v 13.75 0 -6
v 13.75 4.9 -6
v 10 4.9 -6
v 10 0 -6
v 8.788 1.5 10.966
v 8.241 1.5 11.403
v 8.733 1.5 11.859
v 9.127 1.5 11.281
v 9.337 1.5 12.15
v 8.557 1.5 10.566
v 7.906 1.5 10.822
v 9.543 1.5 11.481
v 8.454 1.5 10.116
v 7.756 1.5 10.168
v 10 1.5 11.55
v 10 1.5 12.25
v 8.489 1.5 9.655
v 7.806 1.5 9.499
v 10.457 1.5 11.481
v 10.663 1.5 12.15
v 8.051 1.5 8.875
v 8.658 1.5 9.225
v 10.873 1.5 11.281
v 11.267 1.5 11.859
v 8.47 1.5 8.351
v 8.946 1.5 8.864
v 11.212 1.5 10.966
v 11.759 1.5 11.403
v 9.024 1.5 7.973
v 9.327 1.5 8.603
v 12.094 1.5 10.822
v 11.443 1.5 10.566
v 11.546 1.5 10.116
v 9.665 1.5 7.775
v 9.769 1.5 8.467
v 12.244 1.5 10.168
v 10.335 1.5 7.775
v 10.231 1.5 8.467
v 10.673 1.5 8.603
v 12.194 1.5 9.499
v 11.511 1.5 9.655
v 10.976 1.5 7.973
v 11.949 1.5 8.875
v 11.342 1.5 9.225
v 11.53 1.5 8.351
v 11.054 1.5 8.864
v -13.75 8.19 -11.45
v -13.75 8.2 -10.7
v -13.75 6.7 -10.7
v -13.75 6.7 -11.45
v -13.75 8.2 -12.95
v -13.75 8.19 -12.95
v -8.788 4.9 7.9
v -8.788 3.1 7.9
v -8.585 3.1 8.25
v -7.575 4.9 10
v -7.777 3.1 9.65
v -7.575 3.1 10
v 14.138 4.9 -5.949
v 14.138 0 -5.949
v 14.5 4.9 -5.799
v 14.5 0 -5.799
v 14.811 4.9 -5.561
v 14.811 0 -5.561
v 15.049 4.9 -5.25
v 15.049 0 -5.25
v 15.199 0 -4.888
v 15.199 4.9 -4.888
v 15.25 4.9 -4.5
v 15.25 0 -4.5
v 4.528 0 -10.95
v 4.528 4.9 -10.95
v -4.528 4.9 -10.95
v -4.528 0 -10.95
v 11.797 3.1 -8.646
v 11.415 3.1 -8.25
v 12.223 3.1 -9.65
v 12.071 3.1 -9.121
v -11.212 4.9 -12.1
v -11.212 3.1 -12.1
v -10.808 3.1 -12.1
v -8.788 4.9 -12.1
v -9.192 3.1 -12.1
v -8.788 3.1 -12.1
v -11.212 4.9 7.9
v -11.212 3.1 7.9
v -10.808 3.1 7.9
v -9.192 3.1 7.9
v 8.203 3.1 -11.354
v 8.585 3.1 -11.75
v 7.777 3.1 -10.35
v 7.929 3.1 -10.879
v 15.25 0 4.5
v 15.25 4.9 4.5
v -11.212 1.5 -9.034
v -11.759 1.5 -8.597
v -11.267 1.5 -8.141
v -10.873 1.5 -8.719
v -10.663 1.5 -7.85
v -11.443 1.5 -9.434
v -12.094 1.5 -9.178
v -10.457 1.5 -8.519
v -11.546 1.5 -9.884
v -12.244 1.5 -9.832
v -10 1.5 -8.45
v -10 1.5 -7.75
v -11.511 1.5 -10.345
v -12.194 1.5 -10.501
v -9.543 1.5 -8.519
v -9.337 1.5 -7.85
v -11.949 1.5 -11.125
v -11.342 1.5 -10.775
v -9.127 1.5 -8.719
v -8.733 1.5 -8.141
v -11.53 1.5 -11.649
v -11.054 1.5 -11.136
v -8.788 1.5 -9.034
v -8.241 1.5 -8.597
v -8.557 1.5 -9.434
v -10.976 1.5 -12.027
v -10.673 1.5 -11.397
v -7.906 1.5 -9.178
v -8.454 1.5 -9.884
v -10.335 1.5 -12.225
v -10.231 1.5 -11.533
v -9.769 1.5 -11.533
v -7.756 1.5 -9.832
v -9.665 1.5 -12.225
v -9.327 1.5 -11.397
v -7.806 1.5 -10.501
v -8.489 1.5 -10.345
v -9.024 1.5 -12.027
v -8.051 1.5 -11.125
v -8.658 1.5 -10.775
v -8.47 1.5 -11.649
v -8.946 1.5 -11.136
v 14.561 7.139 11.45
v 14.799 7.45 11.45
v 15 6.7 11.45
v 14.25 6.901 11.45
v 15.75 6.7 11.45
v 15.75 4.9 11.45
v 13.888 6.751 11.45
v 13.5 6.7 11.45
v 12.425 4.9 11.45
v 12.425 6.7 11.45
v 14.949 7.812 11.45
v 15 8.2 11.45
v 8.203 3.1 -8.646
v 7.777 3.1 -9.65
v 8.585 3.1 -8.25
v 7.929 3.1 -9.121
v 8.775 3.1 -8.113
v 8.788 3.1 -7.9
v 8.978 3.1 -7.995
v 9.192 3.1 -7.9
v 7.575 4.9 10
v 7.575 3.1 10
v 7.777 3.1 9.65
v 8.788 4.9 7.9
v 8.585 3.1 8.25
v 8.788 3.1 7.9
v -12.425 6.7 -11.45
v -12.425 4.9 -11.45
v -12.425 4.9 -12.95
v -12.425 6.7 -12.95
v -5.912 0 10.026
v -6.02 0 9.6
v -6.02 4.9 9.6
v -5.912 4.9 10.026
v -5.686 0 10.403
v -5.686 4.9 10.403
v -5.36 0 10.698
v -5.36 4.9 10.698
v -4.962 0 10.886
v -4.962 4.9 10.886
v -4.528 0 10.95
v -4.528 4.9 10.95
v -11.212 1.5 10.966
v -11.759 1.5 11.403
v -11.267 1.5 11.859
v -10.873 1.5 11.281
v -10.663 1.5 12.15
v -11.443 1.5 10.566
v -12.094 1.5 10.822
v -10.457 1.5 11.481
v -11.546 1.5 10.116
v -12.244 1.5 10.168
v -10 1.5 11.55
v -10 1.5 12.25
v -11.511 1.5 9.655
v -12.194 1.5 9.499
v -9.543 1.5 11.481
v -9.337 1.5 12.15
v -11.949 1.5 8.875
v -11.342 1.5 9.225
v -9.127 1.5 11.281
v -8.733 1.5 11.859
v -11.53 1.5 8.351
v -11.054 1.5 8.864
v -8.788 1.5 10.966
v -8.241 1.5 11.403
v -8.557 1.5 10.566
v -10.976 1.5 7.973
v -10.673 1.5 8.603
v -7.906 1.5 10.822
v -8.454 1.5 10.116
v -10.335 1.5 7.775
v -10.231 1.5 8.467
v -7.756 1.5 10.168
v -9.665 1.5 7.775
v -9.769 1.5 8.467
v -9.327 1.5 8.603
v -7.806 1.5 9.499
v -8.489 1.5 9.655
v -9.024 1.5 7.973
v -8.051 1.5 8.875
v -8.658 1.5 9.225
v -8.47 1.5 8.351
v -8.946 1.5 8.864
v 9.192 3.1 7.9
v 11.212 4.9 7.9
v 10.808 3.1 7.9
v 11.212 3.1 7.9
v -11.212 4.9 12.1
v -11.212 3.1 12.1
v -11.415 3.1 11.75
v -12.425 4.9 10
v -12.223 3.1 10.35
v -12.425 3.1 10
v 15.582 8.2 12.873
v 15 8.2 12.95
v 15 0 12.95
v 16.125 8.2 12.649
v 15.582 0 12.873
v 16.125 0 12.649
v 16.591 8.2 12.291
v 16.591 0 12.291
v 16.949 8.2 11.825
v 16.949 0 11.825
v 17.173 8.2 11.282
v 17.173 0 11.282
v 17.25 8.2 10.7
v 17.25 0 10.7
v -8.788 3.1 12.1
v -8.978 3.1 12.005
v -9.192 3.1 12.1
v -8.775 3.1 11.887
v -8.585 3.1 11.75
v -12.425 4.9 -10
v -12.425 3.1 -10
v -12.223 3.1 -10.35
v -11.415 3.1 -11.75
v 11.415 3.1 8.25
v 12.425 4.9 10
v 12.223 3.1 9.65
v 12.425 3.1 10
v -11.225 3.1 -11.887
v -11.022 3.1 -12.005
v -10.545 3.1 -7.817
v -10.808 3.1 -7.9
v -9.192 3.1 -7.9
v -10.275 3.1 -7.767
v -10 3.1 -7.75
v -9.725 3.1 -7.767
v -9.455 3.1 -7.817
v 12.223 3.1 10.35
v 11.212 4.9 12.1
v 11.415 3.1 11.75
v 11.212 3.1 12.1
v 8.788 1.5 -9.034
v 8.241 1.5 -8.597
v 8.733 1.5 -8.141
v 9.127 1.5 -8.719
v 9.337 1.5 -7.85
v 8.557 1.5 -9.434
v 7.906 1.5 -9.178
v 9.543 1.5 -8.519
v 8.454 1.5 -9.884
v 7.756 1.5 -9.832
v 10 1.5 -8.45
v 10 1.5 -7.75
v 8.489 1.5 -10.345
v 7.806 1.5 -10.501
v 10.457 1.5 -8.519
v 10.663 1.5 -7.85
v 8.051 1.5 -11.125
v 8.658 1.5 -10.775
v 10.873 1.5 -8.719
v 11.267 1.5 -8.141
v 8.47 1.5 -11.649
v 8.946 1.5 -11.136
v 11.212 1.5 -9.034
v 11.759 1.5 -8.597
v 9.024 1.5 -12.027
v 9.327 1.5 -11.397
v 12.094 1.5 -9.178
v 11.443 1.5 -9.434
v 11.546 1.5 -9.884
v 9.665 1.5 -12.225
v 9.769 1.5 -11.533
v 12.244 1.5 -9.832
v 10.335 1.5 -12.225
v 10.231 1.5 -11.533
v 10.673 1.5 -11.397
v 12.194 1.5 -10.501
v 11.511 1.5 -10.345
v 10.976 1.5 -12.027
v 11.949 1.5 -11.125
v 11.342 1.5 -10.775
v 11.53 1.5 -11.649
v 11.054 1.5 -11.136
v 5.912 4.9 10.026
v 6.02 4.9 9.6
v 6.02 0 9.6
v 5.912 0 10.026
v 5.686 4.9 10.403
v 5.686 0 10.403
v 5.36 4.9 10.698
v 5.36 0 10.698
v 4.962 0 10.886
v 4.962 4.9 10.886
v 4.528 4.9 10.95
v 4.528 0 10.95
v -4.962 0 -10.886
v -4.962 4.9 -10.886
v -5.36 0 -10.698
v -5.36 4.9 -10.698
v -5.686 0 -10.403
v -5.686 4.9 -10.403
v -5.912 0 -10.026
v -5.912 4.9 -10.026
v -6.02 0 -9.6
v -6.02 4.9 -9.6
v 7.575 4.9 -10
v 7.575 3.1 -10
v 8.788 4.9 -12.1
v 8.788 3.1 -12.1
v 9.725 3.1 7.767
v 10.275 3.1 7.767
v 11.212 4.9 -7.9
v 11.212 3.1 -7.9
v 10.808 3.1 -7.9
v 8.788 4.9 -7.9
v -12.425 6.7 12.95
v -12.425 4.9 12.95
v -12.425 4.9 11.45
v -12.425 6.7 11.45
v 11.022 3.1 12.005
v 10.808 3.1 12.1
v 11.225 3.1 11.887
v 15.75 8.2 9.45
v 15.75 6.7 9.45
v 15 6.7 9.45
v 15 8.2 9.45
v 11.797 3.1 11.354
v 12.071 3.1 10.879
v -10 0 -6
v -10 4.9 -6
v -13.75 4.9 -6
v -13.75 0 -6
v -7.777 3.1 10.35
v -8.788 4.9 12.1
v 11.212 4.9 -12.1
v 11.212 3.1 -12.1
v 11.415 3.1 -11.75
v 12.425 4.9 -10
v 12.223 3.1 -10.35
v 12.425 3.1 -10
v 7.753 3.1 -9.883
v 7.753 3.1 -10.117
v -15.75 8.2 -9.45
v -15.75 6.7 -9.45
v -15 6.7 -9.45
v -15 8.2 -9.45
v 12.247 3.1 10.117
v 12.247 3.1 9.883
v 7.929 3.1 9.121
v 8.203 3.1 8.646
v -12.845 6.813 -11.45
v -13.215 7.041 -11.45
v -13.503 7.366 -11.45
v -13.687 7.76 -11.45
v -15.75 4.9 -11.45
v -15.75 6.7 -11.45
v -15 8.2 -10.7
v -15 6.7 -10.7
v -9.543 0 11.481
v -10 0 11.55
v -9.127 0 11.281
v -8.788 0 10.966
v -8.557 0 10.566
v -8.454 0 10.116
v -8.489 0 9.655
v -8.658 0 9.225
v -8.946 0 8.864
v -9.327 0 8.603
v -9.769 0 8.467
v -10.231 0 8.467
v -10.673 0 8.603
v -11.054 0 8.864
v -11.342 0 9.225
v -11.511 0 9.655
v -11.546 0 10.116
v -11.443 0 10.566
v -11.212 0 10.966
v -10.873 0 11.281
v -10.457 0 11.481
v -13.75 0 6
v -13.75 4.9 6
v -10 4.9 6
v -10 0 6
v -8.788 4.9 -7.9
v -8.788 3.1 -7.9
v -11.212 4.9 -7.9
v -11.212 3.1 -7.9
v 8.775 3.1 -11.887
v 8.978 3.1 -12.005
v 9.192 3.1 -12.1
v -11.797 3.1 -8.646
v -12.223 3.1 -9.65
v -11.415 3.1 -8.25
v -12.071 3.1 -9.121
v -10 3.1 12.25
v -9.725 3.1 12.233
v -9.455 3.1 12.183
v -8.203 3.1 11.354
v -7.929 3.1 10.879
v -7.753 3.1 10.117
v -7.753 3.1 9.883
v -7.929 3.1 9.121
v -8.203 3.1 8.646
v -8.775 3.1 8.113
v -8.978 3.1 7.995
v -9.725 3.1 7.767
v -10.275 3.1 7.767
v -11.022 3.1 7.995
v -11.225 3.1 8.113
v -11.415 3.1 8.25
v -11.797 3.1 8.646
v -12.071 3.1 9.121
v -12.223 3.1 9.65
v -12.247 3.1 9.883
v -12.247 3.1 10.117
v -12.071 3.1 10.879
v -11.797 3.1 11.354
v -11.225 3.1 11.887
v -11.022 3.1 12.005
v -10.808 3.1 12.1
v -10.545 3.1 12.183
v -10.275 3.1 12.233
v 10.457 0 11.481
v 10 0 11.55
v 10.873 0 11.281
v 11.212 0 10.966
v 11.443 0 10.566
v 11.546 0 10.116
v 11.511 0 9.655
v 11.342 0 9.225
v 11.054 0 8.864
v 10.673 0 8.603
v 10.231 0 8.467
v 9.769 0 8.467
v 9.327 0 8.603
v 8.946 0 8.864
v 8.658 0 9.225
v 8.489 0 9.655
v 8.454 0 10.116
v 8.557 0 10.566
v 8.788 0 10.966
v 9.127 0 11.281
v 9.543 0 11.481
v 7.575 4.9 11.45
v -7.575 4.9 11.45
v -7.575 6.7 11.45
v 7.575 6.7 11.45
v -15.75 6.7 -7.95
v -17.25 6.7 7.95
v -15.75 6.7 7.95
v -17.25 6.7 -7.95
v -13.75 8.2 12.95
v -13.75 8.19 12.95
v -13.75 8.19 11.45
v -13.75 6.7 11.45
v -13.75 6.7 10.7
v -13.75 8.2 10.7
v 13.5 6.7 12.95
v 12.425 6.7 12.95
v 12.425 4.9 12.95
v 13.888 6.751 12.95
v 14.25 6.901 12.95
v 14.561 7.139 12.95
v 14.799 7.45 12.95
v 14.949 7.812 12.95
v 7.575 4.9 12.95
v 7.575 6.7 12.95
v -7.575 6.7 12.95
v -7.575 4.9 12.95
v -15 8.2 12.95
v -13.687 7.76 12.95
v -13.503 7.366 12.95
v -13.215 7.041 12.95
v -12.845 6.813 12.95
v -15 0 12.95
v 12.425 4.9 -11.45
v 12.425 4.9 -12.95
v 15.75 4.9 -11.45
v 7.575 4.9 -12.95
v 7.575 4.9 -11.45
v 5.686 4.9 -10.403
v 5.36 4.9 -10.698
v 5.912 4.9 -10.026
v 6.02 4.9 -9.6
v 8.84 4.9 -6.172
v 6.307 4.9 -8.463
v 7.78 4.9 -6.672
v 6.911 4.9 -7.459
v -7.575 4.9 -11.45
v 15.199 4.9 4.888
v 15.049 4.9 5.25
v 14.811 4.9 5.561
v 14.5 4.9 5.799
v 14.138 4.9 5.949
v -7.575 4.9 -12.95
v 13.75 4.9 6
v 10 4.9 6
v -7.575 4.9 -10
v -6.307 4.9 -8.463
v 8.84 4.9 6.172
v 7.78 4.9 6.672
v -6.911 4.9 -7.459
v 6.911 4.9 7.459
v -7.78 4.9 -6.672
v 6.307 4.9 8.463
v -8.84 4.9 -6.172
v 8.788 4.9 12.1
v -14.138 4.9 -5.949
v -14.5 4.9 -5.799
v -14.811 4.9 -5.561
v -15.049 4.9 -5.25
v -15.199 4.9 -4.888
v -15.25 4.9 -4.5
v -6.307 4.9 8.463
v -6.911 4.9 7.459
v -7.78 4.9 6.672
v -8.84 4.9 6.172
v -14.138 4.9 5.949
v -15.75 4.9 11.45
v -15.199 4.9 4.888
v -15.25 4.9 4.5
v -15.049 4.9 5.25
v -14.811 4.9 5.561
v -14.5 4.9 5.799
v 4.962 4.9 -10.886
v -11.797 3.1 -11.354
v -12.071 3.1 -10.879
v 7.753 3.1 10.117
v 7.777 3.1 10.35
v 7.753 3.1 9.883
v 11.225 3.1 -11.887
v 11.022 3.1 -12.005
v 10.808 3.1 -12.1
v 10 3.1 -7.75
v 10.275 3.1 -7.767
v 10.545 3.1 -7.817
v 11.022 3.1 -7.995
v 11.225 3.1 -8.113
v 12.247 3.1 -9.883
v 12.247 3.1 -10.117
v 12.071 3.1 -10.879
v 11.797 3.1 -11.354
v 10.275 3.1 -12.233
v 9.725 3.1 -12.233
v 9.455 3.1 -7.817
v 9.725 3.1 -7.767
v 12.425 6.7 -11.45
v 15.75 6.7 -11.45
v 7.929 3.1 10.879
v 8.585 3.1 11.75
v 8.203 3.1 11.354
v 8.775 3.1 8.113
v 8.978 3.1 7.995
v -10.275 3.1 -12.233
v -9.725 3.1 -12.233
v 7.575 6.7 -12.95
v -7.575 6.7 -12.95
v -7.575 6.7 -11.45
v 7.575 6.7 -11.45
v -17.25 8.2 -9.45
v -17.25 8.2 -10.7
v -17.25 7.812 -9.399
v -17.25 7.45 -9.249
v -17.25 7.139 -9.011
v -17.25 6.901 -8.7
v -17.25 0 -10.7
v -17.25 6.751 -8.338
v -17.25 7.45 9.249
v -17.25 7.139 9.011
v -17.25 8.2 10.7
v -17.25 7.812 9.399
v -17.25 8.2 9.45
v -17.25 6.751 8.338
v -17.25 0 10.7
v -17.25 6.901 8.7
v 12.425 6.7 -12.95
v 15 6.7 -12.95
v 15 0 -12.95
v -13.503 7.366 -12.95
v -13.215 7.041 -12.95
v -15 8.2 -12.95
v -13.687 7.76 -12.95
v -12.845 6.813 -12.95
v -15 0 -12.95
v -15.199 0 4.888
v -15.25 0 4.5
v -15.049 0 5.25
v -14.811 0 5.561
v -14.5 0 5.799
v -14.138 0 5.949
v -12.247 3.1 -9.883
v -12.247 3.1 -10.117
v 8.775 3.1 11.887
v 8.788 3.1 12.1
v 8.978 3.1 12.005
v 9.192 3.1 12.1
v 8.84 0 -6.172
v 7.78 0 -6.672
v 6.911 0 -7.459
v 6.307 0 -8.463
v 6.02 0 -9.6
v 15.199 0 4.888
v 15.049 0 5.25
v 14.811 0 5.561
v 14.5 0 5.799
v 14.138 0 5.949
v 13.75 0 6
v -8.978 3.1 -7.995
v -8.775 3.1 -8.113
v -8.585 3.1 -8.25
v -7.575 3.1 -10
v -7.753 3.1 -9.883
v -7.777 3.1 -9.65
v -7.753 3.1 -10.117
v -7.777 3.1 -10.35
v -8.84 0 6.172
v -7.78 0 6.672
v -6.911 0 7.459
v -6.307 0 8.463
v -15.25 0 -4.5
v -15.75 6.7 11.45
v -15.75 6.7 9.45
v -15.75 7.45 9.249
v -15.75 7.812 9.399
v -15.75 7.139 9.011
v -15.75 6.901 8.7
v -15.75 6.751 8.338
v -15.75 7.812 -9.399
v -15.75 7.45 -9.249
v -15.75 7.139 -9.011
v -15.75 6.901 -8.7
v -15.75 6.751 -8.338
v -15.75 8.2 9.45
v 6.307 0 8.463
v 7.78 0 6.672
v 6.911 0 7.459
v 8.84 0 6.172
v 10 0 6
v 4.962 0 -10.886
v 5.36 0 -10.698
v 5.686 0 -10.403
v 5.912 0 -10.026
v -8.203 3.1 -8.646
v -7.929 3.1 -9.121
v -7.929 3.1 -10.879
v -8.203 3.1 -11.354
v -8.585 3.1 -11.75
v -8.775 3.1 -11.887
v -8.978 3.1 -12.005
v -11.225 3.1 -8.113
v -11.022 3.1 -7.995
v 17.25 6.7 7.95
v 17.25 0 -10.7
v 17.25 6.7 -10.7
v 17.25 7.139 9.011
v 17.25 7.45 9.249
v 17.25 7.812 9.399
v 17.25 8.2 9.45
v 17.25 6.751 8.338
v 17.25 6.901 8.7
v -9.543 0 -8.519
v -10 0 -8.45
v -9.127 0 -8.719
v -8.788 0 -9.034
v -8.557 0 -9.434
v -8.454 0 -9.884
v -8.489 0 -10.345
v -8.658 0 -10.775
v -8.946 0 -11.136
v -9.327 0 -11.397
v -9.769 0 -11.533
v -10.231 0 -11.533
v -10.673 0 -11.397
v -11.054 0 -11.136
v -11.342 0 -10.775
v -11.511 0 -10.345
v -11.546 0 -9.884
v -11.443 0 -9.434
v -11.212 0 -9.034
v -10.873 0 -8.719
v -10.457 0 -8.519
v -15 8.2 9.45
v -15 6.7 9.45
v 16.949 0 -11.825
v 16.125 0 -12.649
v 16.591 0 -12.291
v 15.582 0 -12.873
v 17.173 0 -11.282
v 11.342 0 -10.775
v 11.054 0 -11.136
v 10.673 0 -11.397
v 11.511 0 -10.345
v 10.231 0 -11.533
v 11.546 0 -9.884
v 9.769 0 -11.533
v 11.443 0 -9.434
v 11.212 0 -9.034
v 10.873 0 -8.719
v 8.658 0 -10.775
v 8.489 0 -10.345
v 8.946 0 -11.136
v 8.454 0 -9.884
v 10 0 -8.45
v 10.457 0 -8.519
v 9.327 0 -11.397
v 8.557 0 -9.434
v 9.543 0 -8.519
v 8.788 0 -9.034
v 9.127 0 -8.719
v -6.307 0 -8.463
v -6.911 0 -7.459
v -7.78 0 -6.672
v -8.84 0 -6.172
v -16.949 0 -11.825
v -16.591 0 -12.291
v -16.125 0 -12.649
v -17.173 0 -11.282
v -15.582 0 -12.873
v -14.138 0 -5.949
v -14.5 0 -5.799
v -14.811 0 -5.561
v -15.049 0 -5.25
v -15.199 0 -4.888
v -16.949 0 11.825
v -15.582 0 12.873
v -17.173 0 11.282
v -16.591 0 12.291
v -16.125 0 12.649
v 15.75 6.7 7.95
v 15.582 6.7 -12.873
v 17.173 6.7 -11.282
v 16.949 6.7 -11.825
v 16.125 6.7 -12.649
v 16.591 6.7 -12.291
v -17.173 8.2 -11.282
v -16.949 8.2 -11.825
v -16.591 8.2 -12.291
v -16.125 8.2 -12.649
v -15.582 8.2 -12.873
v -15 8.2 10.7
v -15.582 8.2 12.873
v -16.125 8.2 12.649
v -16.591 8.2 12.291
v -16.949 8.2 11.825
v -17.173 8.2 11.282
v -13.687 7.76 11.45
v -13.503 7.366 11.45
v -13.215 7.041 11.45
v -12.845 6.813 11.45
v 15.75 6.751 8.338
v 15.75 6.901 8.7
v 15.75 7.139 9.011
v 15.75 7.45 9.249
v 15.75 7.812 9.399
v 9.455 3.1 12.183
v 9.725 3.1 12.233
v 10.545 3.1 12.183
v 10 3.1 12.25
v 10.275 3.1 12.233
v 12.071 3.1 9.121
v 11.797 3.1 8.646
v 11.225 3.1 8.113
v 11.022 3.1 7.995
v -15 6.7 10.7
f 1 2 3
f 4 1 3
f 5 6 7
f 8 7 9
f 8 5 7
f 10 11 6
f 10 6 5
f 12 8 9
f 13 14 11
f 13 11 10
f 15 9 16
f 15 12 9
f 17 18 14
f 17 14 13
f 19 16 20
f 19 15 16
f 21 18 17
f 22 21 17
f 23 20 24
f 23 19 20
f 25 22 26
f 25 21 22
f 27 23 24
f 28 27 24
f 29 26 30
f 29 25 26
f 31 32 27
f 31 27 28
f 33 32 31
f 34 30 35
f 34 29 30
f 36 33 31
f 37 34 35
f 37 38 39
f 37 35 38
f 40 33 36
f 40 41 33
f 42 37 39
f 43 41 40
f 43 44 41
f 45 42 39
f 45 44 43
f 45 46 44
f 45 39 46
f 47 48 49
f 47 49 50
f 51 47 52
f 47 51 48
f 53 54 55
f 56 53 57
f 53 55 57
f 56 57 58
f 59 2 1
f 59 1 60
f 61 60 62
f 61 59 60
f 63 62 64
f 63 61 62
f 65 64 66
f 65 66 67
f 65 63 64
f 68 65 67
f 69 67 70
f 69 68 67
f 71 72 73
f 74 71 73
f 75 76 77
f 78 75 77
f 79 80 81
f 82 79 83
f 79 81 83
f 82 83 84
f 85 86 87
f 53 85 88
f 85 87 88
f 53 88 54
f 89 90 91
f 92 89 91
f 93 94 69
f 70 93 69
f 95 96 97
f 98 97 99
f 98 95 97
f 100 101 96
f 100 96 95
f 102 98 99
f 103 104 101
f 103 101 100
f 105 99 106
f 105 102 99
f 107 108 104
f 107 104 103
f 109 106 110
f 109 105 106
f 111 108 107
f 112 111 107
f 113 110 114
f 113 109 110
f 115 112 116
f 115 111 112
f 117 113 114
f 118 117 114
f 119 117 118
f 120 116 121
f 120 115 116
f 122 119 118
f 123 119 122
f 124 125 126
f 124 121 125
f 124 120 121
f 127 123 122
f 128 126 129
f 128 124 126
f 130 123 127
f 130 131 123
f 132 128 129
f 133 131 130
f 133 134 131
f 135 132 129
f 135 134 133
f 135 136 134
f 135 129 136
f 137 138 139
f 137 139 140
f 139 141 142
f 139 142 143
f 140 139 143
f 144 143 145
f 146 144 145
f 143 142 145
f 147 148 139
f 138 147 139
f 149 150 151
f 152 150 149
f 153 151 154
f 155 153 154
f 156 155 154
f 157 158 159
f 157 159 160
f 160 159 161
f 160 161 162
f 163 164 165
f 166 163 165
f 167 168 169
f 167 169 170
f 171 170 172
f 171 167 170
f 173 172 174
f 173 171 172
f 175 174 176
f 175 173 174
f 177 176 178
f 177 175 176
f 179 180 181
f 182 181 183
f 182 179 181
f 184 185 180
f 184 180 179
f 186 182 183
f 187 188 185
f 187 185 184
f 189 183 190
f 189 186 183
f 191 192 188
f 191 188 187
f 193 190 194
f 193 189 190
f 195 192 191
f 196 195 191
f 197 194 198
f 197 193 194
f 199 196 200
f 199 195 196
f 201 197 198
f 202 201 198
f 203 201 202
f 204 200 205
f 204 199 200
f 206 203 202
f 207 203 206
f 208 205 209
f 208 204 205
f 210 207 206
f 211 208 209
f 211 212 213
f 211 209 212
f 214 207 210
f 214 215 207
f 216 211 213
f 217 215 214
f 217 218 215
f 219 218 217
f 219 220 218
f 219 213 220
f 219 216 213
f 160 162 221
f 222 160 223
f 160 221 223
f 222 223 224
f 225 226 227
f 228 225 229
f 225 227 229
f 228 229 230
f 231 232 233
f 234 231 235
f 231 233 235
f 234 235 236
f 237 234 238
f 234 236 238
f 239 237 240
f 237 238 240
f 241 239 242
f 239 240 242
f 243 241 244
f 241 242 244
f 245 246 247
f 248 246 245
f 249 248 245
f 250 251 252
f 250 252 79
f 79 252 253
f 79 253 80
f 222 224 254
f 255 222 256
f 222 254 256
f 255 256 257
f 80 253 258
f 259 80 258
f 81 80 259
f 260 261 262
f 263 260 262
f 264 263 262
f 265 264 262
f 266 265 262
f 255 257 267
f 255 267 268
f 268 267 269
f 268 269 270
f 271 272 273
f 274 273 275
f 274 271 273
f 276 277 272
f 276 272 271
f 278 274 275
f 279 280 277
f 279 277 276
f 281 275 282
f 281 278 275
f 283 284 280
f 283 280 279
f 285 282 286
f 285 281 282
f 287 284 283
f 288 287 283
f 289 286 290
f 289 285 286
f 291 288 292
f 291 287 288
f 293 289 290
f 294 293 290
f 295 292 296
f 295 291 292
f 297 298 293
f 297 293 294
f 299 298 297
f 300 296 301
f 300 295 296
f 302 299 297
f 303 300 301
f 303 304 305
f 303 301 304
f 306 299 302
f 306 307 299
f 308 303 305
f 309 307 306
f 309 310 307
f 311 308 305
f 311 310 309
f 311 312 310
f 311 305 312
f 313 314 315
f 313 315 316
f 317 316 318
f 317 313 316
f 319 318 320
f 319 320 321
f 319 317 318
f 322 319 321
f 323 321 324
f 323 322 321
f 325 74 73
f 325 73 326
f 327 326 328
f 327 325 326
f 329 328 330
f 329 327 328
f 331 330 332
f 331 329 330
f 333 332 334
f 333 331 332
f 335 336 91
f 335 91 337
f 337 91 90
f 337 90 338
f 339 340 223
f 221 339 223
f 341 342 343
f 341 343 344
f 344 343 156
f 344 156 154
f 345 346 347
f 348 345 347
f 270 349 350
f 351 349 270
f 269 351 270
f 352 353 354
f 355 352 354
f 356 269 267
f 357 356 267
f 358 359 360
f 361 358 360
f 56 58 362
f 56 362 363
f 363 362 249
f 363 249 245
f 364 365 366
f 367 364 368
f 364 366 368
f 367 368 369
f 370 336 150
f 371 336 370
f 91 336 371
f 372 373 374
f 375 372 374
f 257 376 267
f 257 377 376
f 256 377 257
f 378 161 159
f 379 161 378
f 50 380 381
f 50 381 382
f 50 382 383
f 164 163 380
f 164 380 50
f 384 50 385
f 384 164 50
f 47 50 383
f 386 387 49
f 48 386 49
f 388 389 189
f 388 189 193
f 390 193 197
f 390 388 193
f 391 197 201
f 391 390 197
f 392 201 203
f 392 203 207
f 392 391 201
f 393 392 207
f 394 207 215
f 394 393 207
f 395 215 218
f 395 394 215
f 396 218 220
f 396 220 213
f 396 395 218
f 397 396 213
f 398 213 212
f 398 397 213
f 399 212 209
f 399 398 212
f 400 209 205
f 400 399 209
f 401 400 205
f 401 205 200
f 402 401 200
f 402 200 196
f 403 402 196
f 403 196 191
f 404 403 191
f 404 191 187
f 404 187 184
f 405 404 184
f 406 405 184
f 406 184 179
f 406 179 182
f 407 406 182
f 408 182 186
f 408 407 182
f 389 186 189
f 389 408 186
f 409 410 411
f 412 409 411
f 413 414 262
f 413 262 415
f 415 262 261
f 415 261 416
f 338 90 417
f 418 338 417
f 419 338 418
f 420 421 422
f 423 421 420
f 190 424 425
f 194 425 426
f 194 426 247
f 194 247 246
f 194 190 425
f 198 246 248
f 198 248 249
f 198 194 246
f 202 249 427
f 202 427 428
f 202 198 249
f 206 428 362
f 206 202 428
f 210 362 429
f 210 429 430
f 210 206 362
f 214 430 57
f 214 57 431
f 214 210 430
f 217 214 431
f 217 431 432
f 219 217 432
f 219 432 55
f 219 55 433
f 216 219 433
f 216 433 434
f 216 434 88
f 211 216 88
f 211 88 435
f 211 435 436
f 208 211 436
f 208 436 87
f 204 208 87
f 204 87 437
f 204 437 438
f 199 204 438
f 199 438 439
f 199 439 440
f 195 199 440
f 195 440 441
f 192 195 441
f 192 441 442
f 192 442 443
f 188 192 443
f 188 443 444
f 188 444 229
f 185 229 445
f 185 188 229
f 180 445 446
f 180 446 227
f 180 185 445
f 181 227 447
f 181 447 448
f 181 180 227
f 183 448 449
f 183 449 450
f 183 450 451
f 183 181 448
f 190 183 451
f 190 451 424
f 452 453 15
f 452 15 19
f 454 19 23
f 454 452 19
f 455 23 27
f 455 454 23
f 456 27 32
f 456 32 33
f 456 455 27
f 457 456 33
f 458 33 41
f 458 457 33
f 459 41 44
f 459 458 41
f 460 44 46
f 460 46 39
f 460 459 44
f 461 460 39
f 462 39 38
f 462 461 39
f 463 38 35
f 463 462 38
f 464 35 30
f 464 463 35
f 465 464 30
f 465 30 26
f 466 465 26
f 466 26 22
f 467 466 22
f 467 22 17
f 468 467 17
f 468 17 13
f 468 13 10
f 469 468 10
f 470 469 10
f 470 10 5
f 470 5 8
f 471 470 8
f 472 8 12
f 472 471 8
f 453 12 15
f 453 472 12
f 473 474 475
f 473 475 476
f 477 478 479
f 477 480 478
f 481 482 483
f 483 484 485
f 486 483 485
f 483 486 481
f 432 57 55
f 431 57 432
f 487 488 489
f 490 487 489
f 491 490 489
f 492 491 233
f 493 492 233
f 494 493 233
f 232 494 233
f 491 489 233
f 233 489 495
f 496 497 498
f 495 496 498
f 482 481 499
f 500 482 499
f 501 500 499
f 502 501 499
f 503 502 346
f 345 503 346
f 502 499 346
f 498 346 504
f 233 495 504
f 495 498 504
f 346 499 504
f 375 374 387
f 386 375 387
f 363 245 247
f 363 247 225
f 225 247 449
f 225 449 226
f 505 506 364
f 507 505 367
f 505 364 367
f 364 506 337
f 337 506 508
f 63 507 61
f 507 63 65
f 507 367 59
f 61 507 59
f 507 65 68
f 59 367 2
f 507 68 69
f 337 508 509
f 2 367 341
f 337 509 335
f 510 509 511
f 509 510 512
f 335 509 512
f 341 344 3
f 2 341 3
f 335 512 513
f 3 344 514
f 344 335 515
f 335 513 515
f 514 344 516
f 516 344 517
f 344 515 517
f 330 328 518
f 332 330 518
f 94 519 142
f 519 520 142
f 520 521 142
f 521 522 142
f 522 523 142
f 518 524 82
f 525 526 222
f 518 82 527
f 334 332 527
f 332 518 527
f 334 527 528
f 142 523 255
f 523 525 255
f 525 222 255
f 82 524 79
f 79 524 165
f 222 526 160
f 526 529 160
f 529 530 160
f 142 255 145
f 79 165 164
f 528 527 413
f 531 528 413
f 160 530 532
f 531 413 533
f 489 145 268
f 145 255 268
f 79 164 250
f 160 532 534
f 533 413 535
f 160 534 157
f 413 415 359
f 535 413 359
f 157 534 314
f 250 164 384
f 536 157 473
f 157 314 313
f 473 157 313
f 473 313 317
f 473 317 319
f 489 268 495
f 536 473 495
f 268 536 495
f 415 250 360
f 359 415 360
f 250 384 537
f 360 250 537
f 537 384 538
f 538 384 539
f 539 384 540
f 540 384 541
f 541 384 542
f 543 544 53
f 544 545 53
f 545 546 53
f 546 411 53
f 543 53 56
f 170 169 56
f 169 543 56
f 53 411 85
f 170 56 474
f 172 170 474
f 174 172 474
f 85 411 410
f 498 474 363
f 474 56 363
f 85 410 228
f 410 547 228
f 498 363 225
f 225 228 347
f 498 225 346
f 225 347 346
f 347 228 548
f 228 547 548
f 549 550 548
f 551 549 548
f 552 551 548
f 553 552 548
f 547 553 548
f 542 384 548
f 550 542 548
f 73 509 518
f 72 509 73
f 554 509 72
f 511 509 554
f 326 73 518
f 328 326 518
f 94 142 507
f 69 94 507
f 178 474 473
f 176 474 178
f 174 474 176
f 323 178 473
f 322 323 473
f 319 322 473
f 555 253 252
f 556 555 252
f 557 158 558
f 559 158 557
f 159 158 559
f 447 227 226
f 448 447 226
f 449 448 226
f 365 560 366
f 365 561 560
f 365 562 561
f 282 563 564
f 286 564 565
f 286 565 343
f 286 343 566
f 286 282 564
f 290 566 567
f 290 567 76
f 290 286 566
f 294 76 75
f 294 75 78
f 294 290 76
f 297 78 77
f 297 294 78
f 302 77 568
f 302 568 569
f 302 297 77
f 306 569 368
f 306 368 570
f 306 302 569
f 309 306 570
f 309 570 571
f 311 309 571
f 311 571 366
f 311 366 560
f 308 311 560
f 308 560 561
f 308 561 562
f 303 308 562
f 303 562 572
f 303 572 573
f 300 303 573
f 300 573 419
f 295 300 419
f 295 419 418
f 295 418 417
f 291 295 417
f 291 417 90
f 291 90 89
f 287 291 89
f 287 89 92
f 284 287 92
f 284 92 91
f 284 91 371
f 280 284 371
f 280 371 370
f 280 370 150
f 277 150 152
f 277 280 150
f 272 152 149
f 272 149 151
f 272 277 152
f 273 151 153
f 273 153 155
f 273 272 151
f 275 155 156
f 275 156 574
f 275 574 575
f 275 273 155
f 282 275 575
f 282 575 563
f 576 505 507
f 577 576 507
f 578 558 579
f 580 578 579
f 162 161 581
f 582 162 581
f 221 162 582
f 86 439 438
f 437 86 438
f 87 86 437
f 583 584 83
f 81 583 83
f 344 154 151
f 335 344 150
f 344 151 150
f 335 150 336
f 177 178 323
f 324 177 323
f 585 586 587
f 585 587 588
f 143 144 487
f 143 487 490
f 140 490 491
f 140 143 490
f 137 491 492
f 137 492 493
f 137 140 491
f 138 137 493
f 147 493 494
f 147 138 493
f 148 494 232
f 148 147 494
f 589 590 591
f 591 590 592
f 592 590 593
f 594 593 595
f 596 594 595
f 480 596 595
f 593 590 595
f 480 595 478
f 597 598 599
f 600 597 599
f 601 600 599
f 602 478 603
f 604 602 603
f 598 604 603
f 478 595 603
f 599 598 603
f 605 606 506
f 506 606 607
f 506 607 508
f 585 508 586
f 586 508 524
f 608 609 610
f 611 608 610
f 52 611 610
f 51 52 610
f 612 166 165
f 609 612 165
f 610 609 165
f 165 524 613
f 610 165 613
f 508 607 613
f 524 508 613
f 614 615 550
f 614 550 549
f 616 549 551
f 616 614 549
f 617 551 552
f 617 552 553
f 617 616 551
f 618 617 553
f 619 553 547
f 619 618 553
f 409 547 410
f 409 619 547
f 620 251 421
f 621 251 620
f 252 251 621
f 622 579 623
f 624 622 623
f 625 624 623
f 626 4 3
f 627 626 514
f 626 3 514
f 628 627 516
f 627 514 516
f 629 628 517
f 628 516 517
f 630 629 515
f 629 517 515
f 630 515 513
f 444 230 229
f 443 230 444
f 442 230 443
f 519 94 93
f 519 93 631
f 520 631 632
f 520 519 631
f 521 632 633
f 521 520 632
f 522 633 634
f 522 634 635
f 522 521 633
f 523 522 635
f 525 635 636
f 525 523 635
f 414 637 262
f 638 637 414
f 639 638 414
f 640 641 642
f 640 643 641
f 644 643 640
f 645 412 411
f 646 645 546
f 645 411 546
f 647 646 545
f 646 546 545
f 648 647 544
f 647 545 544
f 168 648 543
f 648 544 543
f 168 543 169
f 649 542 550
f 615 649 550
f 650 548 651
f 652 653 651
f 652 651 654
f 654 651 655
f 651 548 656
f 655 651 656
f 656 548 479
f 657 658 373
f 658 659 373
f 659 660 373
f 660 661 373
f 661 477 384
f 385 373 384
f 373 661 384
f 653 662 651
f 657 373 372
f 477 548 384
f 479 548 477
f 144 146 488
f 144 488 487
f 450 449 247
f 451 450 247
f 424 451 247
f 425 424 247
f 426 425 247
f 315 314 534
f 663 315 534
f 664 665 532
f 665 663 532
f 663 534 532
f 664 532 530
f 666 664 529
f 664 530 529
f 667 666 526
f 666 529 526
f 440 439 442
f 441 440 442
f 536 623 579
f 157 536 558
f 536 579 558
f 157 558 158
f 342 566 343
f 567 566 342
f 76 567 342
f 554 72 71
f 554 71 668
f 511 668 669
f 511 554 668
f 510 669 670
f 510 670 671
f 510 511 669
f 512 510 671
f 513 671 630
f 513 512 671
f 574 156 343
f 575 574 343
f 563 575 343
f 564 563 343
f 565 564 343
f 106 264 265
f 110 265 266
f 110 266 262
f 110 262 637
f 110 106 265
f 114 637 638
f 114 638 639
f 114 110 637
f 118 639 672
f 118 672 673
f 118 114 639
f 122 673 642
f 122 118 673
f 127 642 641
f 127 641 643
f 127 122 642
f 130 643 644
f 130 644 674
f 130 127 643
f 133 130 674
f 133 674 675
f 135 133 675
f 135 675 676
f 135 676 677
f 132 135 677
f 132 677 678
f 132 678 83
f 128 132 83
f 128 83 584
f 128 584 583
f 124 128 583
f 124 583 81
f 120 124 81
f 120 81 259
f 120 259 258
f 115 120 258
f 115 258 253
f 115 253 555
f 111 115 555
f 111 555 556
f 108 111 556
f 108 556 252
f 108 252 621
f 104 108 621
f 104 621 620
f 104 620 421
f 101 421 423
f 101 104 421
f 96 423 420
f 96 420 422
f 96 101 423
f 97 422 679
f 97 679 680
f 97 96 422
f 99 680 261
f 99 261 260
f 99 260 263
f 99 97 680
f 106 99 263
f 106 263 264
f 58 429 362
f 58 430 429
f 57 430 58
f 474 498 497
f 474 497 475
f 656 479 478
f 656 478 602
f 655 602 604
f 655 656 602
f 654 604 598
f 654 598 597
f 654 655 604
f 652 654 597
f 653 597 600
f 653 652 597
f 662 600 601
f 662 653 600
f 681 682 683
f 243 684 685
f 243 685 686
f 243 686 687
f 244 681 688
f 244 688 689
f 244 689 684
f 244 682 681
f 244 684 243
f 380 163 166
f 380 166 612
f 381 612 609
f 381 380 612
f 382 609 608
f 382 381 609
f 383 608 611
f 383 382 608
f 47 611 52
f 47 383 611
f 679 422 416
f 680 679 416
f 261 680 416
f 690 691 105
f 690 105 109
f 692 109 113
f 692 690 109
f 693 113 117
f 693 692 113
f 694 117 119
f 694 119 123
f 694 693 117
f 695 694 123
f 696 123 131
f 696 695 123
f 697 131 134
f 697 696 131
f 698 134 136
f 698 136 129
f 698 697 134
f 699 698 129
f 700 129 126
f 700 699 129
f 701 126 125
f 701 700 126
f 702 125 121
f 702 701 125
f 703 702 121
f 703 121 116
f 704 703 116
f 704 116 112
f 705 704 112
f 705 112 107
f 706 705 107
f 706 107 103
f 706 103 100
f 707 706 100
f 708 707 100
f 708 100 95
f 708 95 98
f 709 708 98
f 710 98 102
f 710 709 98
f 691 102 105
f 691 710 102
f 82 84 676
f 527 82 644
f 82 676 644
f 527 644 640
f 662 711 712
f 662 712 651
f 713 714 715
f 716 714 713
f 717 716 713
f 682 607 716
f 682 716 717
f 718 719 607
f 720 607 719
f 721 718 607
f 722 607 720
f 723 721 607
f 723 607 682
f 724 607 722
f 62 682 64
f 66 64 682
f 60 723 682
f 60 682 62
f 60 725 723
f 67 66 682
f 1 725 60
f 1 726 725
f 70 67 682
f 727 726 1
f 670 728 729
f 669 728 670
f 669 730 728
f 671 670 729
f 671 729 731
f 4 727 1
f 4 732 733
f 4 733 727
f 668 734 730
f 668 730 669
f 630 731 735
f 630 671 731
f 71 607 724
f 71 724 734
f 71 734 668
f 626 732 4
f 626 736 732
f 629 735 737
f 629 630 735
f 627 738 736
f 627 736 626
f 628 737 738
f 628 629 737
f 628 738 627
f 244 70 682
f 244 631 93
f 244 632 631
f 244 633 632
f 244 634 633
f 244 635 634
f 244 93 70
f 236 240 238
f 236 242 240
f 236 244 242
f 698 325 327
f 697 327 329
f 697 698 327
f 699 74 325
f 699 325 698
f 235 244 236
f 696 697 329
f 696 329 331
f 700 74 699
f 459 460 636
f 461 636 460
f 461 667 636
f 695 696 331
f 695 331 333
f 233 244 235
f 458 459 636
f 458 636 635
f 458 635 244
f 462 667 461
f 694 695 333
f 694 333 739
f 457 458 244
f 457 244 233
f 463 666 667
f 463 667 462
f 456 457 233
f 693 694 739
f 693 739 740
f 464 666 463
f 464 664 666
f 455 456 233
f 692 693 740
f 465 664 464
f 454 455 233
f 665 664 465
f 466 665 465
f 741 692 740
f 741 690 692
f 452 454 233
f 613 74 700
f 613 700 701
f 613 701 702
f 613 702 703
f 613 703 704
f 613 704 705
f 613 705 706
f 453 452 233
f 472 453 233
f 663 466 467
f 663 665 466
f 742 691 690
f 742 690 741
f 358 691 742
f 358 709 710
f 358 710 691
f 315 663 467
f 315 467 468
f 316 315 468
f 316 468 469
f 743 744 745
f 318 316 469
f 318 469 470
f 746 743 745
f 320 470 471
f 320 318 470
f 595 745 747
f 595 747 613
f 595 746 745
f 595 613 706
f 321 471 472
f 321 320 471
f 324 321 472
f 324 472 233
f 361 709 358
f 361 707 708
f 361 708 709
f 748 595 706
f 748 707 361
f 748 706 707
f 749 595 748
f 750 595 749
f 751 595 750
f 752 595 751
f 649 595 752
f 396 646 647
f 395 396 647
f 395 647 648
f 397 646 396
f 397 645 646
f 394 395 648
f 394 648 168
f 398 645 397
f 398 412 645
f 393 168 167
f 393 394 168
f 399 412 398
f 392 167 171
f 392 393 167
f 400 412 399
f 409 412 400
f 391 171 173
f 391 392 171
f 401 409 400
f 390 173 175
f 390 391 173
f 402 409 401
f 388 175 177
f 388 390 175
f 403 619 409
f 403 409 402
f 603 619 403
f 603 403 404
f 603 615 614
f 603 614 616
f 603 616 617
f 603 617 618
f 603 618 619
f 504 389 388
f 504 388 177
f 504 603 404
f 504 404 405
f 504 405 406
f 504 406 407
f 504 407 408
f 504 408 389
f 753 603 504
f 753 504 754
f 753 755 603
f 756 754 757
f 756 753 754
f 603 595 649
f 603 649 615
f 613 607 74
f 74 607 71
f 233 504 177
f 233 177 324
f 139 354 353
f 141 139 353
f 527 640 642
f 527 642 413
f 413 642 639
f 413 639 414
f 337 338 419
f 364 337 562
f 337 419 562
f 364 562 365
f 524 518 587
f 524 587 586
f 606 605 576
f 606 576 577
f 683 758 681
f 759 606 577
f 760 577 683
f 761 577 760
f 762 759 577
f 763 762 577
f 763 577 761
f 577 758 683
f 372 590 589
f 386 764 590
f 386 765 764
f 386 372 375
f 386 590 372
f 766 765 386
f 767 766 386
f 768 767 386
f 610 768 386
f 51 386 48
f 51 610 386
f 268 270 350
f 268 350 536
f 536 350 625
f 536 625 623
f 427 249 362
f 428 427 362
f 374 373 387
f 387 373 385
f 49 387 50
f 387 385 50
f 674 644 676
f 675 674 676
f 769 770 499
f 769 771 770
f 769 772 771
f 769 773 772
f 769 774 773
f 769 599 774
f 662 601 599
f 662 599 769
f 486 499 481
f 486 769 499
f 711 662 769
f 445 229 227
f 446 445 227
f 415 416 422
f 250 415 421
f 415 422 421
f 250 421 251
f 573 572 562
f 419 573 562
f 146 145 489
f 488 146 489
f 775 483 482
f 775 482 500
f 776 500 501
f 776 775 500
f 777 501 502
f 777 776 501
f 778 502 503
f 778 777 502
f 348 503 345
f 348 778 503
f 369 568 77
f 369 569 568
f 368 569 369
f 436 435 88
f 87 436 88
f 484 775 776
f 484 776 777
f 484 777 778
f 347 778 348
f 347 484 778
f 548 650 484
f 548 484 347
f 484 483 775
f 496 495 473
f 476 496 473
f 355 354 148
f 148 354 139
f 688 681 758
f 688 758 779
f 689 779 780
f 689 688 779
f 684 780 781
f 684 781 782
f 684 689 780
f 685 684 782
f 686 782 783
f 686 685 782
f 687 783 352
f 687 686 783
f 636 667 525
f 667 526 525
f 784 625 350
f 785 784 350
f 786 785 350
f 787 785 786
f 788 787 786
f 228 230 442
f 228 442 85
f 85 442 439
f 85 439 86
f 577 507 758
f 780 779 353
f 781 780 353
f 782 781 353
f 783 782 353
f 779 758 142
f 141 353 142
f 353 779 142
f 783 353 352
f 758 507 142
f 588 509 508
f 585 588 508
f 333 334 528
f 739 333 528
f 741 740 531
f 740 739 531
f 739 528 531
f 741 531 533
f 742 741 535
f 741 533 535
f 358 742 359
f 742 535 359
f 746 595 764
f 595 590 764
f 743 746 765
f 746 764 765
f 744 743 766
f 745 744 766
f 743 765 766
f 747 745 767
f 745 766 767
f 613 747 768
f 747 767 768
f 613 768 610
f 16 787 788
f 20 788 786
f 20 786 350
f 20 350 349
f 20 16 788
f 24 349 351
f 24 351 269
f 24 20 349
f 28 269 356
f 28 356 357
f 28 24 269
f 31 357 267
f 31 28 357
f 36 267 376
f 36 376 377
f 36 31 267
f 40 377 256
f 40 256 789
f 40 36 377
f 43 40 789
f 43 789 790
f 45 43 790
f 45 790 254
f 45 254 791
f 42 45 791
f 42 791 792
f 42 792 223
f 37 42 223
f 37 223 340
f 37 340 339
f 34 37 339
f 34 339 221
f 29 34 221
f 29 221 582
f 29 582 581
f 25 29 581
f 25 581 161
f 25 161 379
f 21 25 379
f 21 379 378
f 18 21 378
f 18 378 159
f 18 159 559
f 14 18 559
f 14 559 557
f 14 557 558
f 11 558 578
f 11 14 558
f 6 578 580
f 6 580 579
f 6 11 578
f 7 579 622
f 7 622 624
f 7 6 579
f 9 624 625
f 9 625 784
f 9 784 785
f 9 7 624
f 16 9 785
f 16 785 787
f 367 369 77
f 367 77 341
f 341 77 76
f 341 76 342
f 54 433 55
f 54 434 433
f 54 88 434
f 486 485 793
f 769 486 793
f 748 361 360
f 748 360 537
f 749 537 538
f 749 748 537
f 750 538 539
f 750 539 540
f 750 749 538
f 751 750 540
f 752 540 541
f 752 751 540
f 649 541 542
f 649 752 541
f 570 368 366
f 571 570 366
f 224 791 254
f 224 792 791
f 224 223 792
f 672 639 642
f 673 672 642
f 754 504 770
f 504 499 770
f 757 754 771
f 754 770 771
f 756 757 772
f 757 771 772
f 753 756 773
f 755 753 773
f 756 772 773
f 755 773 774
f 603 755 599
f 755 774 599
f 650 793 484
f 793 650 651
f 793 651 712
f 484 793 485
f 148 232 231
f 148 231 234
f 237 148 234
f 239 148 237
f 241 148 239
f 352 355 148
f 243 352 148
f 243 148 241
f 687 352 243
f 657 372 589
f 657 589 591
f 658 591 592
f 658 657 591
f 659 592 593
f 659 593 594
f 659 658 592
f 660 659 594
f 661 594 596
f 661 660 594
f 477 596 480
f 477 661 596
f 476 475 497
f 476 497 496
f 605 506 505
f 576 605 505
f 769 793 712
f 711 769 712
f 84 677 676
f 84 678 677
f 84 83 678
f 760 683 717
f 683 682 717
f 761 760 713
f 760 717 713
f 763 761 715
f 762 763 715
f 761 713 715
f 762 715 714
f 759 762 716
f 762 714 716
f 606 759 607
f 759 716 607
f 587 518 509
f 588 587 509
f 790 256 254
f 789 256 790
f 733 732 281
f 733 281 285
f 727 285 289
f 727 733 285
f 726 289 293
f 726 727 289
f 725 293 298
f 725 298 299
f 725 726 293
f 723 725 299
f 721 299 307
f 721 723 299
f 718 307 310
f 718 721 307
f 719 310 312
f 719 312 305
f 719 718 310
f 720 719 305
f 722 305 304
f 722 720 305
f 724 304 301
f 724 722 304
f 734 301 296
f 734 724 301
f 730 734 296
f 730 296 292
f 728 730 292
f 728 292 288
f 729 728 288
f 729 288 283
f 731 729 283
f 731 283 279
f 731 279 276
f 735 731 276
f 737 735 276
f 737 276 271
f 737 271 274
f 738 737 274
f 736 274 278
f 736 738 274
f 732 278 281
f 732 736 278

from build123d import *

# Parameters (mm, degrees)
SKETCH1_W           = 34.5
SKETCH1_H           = 25.9
SKETCH1_R           = 1.55
BOSS_EXTRUDE1_DEPTH = 1.5
SKETCH3_W           = 34.5
SKETCH3_H           = 25.9
SKETCH3_R           = 2.25
BOSS_EXTRUDE3_DEPTH = 1.6
SKETCH5_W           = 34.5
SKETCH5_H           = 25.9
BOSS_EXTRUDE4_DEPTH = 1.8
SKETCH6_W           = 15.150257738
SKETCH6_H           = 1.5
BOSS_EXTRUDE5_DEPTH = 1.8
BOSS_EXTRUDE6_DEPTH = 1.5
CUT_EXTRUDE1_REACH  = 24.165
FILLET1_R           = 1.5
FILLET2_R           = 2.25


with BuildPart() as part:
    # Sketch1 → Boss-Extrude1 (new body)
    with BuildSketch(Plane(origin=(0, 0, 0), x_dir=(1, 0, 0), z_dir=(0, 1, 0))):
        Rectangle(SKETCH1_W, SKETCH1_H)
        with Locations(Location((-10, 10, 0), (0, 0, 270))):
            Circle(SKETCH1_R, mode=Mode.SUBTRACT)
        with Locations(Location((10, 10, 0), (0, 0, 270))):
            Circle(SKETCH1_R, mode=Mode.SUBTRACT)
        with Locations(Location((10, -10, 0), (0, 0, 270))):
            Circle(SKETCH1_R, mode=Mode.SUBTRACT)
        with Locations(Location((-10, -10, 0), (0, 0, 270))):
            Circle(SKETCH1_R, mode=Mode.SUBTRACT)
    extrude(amount=BOSS_EXTRUDE1_DEPTH)

    # Sketch3 → Boss-Extrude3 (add)
    with BuildSketch(Plane(origin=(0, 1.5, 0), x_dir=(1, 0, 0), z_dir=(0, 1, 0))):
        Rectangle(SKETCH3_W, SKETCH3_H)
        with Locations(Location((-10, 10, 0), (0, 0, 270))):
            Circle(SKETCH3_R, mode=Mode.SUBTRACT)
        with Locations(Location((10, 10, 0), (0, 0, 270))):
            Circle(SKETCH3_R, mode=Mode.SUBTRACT)
        with Locations(Location((10, -10, 0), (0, 0, 270))):
            Circle(SKETCH3_R, mode=Mode.SUBTRACT)
        with Locations(Location((-10, -10, 0), (0, 0, 270))):
            Circle(SKETCH3_R, mode=Mode.SUBTRACT)
    extrude(amount=BOSS_EXTRUDE3_DEPTH)

    # Sketch5 → Boss-Extrude4 (add)
    with BuildSketch(Plane(origin=(0, 3.1, 0), x_dir=(1, 0, 0), z_dir=(0, 1, 0))):
        Rectangle(SKETCH5_W, SKETCH5_H)
        with BuildLine():
            Line((-6, -10.95), (-6, -10))
            ThreePointArc((-6, -10), (-7.171572875, -7.171572875), (-10, -6))
            Line((-10, -6), (-15.25, -6))
            Line((-15.25, -6), (-15.25, 6))
            Line((-15.25, 6), (-10, 6))
            ThreePointArc((-10, 6), (-7.171572875, 7.171572875), (-6, 10))
            Line((-6, 10), (-6, 10.95))
            Line((-6, 10.95), (6, 10.95))
            Line((6, 10.95), (6, 10))
            ThreePointArc((6, 10), (7.171572875, 7.171572875), (10, 6))
            Line((10, 6), (15.25, 6))
            Line((15.25, 6), (15.25, -6))
            Line((15.25, -6), (10, -6))
            ThreePointArc((10, -6), (7.171572875, -7.171572875), (6, -10))
            Line((6, -10), (6, -10.95))
            Line((6, -10.95), (-6, -10.95))
        make_face(mode=Mode.SUBTRACT)
        Polygon((12.424871131, 10), (11.212435565, 7.9), (8.787564435, 7.9), (7.575128869, 10), (8.787564435, 12.1), (11.212435565, 12.1), align=None, mode=Mode.SUBTRACT)
        Polygon((-7.575128869, 10), (-8.787564435, 7.9), (-11.212435565, 7.9), (-12.424871131, 10), (-11.212435565, 12.1), (-8.787564435, 12.1), align=None, mode=Mode.SUBTRACT)
        Polygon((7.575128869, -10), (8.787564435, -7.9), (11.212435565, -7.9), (12.424871131, -10), (11.212435565, -12.1), (8.787564435, -12.1), align=None, mode=Mode.SUBTRACT)
        Polygon((-8.787564435, -12.1), (-11.212435565, -12.1), (-12.424871131, -10), (-11.212435565, -7.9), (-8.787564435, -7.9), (-7.575128869, -10), align=None, mode=Mode.SUBTRACT)
    extrude(amount=BOSS_EXTRUDE4_DEPTH)

    # Sketch6 → Boss-Extrude5 (add)
    with BuildSketch(Plane(origin=(0, 4.9, 0), x_dir=(1, 0, 0), z_dir=(0, 1, 0))):
        Polygon((-12.424871131, -11.45), (-15.75, -11.45), (-15.75, 11.45), (-12.424871131, 11.45), (-12.424871131, 12.95), (-17.25, 12.95), (-17.25, -12.95), (-12.424871131, -12.95), align=None)
        with Locations((0, 12.2)):
            Rectangle(SKETCH6_W, SKETCH6_H)
        Polygon((15.75, -11.45), (12.424871131, -11.45), (12.424871131, -12.95), (17.25, -12.95), (17.25, 12.95), (12.424871131, 12.95), (12.424871131, 11.45), (15.75, 11.45), align=None)
        with Locations((0, -12.2)):
            Rectangle(SKETCH6_W, SKETCH6_H)
    extrude(amount=BOSS_EXTRUDE5_DEPTH)

    # Sketch7 → Boss-Extrude6 (add)
    with BuildSketch(Plane(origin=(0, 6.7, 0), x_dir=(1, 0, 0), z_dir=(0, 1, 0))):
        Polygon((-13.75, 12.95), (-17.25, 12.95), (-17.25, 9.45), (-15.75, 9.45), (-15.75, 11.45), (-13.75, 11.45), align=None)
        Polygon((-13.75, 10.7), (-13.75, 11.45), (-15.75, 11.45), (-15.75, 9.45), (-15, 9.45), (-15, 10.7), align=None)
        Polygon((-15.75, -9.45), (-17.25, -9.45), (-17.25, -12.95), (-13.75, -12.95), (-13.75, -11.45), (-15.75, -11.45), align=None)
        Polygon((-15, -9.45), (-15.75, -9.45), (-15.75, -11.45), (-13.75, -11.45), (-13.75, -10.7), (-15, -10.7), align=None)
        Polygon((17.25, -12.95), (17.25, -9.45), (15, -9.45), (15, -10.7), (15, -12.95), align=None)
    extrude(amount=BOSS_EXTRUDE6_DEPTH)

    # Sketch8 → Cut-Extrude1 (cut, up to next)
    with BuildSketch(Plane(origin=(0, 3.1, 0), x_dir=(1, 0, 0), z_dir=(0, 1, 0)), mode=Mode.PRIVATE) as cut_extrude1_sk1:
        with BuildLine():
            Line((10, -6), (15.25, -6))
            Line((15.25, -6), (15.25, 6))
            Line((15.25, 6), (10, 6))
            ThreePointArc((10, 6), (7.171572875, 7.171572875), (6, 10))
            Line((6, 10), (6, 10.95))
            Line((6, 10.95), (-6, 10.95))
            Line((-6, 10.95), (-6, 10))
            ThreePointArc((-6, 10), (-7.171572875, 7.171572875), (-10, 6))
            Line((-10, 6), (-15.25, 6))
            Line((-15.25, 6), (-15.25, -6))
            Line((-15.25, -6), (-10, -6))
            ThreePointArc((-10, -6), (-7.171572875, -7.171572875), (-6, -10))
            Line((-6, -10), (-6, -10.95))
            Line((-6, -10.95), (6, -10.95))
            Line((6, -10.95), (6, -10))
            ThreePointArc((6, -10), (7.171572875, -7.171572875), (10, -6))
        make_face()
    cut_extrude1_tool1 = extrude(cut_extrude1_sk1.sketch, amount=-CUT_EXTRUDE1_REACH, mode=Mode.PRIVATE) & part.part
    add(cut_extrude1_tool1.solids().sort_by_distance((0, 3.1, 0))[0], mode=Mode.SUBTRACT)

    # Fillet1
    # the kernel refuses this fillet: 1.5 mm, written as the material it adds along each edge
    with BuildSketch(Plane(origin=(6, 4.9, 10.95), x_dir=(-1, 0, 0), z_dir=(0, -1, 0))) as fillet1_piece_1:
        with BuildLine():
            CenterArc((1.472430904, 1.5), FILLET1_R, 185.739170477, 84.260829523)
            Line((-0.020050252, 1.35), (-0.169298367, 1.335))
            ThreePointArc((-0.169298367, 1.335), (-0.15, 0.95), (-0.15, 0))
            Line((-0.15, 0), (0, -0.15))
            Line((0, -0.15), (1.472430904, -0.15))
            Line((1.472430904, -0.15), (1.472430904, 0))
        make_face()
    extrude(amount=4.9)
    with BuildSketch(Plane(origin=(15.25, 4.9, 6), x_dir=(-1, 0, 0), z_dir=(0, -1, 0)), Plane(origin=(15.25, 4.9, -6), x_dir=(0, 0, 1), z_dir=(0, -1, 0))) as fillet1_piece_2:
        with BuildLine():
            CenterArc((FILLET1_R, FILLET1_R), FILLET1_R, 180, 90)
            Line((0, FILLET1_R), (0, 0))
            Line((0, 0), (FILLET1_R, 0))
        make_face()
    extrude(amount=4.9)
    with BuildSketch(Plane(origin=(6, 4.9, -10.95), x_dir=(0.014850400419695863, 0, 0.9998897267235897), z_dir=(0, -1, 0))) as fillet1_piece_3:
        with BuildLine():
            CenterArc((1.477968402, 1.494544135), FILLET1_R, 180.850896545, 84.260829523)
            Line((-0.021866189, 1.472268534), (-0.171849648, 1.470040974))
            Line((-0.171849648, 1.470040974), (-0.149983459, -0.00222756))
            Line((-0.149983459, -0.00222756), (0.00222756, -0.149983459))
            ThreePointArc((0.00222756, -0.149983459), (0.9521228, -0.135875579), (1.337366934, -0.149454413))
            Line((1.337366934, -0.149454413), (1.350148885, 0))
        make_face()
    extrude(amount=4.9)
    with BuildSketch(Plane(origin=(-6, 0, -10.95), x_dir=(1, 0, 0), z_dir=(0, 1, 0))) as fillet1_piece_4:
        with BuildLine():
            CenterArc((1.472430904, -1.5), FILLET1_R, 90, 84.260829523)
            Line((-0.020050252, -1.35), (-0.169298367, -1.335))
            ThreePointArc((-0.169298367, -1.335), (-0.15, -0.95), (-0.15, 0))
            Line((-0.15, 0), (0, 0.15))
            Line((0, 0.15), (1.472430904, 0.15))
            Line((1.472430904, 0.15), (1.472430904, 0))
        make_face()
    extrude(amount=4.9)
    with BuildSketch(Plane(origin=(-15.25, 0, -6), x_dir=(1, 0, 0), z_dir=(0, 1, 0)), Plane(origin=(-15.25, 0, 6), x_dir=(0, 0, -1), z_dir=(0, 1, 0))) as fillet1_piece_5:
        with BuildLine():
            CenterArc((FILLET1_R, -FILLET1_R), FILLET1_R, 90, 90)
            Line((0, -FILLET1_R), (0, 0))
            Line((0, 0), (FILLET1_R, 0))
        make_face()
    extrude(amount=4.9)
    with BuildSketch(Plane(origin=(-6, 0, 10.95), x_dir=(-0.014850400419695205, 0, -0.9998897267235897), z_dir=(0, 1, 0))) as fillet1_piece_6:
        with BuildLine():
            CenterArc((1.477968402, -1.494544135), FILLET1_R, 94.888273932, 84.260829523)
            Line((-0.021866189, -1.472268534), (-0.171849648, -1.470040974))
            Line((-0.171849648, -1.470040974), (-0.149983459, 0.00222756))
            Line((-0.149983459, 0.00222756), (0.00222756, 0.149983459))
            ThreePointArc((0.00222756, 0.149983459), (0.9521228, 0.135875579), (1.337366934, 0.149454413))
            Line((1.337366934, 0.149454413), (1.350148885, 0))
        make_face()
    extrude(amount=4.9)
    with BuildSketch(Plane(origin=(17.25, 6.7, 9.45), x_dir=(0, 0, -1), z_dir=(-1, 0, 0)), Plane(origin=(15, 6.7, 11.45), x_dir=(-1, 0, 0), z_dir=(0, 0, 1)), Plane(origin=(-15.75, 6.7, 9.45), x_dir=(0, 0, -1), z_dir=(-1, 0, 0)), Plane(origin=(-15.75, 6.7, -9.45), x_dir=(0, 1, 0), z_dir=(-1, 0, 0))) as fillet1_piece_7:
        with BuildLine():
            CenterArc((FILLET1_R, -FILLET1_R), FILLET1_R, 90, 90)
            Line((0, -FILLET1_R), (0, 0))
            Line((0, 0), (FILLET1_R, 0))
        make_face()
    extrude(amount=1.5)
    with BuildSketch(Plane(origin=(-13.75, 6.7, -11.45), x_dir=(1, 0, 0), z_dir=(0, 0, -1))) as fillet1_piece_8:
        with BuildLine():
            CenterArc((1.5, -1.489771824), FILLET1_R, 96.694808908, 83.305191092)
            Line((0, -1.489771824), (0, 0))
            Line((0, 0), (1.325128869, 0))
        make_face()
    extrude(amount=1.5)
    with BuildSketch(Plane(origin=(-13.75, 6.7, 11.45), x_dir=(0, 1, 0), z_dir=(0, 0, 1))) as fillet1_piece_9:
        with BuildLine():
            CenterArc((1.489771824, -1.5), FILLET1_R, 90, 83.305191092)
            Line((0, -1.325128869), (0, 0))
            Line((0, 0), (1.489771824, 0))
        make_face()
    extrude(amount=1.5)

    # Fillet2
    fillet2_edges = [part.edges().sort_by_distance(p)[0] for p in [
        (17.25, 4.1, 12.95),
        (-17.25, 4.1, 12.95),
        (-17.25, 4.1, -12.95),
        (17.25, 3.35, -12.95),
    ]]
    fillet(fillet2_edges, radius=FILLET2_R)


solid = part.part
